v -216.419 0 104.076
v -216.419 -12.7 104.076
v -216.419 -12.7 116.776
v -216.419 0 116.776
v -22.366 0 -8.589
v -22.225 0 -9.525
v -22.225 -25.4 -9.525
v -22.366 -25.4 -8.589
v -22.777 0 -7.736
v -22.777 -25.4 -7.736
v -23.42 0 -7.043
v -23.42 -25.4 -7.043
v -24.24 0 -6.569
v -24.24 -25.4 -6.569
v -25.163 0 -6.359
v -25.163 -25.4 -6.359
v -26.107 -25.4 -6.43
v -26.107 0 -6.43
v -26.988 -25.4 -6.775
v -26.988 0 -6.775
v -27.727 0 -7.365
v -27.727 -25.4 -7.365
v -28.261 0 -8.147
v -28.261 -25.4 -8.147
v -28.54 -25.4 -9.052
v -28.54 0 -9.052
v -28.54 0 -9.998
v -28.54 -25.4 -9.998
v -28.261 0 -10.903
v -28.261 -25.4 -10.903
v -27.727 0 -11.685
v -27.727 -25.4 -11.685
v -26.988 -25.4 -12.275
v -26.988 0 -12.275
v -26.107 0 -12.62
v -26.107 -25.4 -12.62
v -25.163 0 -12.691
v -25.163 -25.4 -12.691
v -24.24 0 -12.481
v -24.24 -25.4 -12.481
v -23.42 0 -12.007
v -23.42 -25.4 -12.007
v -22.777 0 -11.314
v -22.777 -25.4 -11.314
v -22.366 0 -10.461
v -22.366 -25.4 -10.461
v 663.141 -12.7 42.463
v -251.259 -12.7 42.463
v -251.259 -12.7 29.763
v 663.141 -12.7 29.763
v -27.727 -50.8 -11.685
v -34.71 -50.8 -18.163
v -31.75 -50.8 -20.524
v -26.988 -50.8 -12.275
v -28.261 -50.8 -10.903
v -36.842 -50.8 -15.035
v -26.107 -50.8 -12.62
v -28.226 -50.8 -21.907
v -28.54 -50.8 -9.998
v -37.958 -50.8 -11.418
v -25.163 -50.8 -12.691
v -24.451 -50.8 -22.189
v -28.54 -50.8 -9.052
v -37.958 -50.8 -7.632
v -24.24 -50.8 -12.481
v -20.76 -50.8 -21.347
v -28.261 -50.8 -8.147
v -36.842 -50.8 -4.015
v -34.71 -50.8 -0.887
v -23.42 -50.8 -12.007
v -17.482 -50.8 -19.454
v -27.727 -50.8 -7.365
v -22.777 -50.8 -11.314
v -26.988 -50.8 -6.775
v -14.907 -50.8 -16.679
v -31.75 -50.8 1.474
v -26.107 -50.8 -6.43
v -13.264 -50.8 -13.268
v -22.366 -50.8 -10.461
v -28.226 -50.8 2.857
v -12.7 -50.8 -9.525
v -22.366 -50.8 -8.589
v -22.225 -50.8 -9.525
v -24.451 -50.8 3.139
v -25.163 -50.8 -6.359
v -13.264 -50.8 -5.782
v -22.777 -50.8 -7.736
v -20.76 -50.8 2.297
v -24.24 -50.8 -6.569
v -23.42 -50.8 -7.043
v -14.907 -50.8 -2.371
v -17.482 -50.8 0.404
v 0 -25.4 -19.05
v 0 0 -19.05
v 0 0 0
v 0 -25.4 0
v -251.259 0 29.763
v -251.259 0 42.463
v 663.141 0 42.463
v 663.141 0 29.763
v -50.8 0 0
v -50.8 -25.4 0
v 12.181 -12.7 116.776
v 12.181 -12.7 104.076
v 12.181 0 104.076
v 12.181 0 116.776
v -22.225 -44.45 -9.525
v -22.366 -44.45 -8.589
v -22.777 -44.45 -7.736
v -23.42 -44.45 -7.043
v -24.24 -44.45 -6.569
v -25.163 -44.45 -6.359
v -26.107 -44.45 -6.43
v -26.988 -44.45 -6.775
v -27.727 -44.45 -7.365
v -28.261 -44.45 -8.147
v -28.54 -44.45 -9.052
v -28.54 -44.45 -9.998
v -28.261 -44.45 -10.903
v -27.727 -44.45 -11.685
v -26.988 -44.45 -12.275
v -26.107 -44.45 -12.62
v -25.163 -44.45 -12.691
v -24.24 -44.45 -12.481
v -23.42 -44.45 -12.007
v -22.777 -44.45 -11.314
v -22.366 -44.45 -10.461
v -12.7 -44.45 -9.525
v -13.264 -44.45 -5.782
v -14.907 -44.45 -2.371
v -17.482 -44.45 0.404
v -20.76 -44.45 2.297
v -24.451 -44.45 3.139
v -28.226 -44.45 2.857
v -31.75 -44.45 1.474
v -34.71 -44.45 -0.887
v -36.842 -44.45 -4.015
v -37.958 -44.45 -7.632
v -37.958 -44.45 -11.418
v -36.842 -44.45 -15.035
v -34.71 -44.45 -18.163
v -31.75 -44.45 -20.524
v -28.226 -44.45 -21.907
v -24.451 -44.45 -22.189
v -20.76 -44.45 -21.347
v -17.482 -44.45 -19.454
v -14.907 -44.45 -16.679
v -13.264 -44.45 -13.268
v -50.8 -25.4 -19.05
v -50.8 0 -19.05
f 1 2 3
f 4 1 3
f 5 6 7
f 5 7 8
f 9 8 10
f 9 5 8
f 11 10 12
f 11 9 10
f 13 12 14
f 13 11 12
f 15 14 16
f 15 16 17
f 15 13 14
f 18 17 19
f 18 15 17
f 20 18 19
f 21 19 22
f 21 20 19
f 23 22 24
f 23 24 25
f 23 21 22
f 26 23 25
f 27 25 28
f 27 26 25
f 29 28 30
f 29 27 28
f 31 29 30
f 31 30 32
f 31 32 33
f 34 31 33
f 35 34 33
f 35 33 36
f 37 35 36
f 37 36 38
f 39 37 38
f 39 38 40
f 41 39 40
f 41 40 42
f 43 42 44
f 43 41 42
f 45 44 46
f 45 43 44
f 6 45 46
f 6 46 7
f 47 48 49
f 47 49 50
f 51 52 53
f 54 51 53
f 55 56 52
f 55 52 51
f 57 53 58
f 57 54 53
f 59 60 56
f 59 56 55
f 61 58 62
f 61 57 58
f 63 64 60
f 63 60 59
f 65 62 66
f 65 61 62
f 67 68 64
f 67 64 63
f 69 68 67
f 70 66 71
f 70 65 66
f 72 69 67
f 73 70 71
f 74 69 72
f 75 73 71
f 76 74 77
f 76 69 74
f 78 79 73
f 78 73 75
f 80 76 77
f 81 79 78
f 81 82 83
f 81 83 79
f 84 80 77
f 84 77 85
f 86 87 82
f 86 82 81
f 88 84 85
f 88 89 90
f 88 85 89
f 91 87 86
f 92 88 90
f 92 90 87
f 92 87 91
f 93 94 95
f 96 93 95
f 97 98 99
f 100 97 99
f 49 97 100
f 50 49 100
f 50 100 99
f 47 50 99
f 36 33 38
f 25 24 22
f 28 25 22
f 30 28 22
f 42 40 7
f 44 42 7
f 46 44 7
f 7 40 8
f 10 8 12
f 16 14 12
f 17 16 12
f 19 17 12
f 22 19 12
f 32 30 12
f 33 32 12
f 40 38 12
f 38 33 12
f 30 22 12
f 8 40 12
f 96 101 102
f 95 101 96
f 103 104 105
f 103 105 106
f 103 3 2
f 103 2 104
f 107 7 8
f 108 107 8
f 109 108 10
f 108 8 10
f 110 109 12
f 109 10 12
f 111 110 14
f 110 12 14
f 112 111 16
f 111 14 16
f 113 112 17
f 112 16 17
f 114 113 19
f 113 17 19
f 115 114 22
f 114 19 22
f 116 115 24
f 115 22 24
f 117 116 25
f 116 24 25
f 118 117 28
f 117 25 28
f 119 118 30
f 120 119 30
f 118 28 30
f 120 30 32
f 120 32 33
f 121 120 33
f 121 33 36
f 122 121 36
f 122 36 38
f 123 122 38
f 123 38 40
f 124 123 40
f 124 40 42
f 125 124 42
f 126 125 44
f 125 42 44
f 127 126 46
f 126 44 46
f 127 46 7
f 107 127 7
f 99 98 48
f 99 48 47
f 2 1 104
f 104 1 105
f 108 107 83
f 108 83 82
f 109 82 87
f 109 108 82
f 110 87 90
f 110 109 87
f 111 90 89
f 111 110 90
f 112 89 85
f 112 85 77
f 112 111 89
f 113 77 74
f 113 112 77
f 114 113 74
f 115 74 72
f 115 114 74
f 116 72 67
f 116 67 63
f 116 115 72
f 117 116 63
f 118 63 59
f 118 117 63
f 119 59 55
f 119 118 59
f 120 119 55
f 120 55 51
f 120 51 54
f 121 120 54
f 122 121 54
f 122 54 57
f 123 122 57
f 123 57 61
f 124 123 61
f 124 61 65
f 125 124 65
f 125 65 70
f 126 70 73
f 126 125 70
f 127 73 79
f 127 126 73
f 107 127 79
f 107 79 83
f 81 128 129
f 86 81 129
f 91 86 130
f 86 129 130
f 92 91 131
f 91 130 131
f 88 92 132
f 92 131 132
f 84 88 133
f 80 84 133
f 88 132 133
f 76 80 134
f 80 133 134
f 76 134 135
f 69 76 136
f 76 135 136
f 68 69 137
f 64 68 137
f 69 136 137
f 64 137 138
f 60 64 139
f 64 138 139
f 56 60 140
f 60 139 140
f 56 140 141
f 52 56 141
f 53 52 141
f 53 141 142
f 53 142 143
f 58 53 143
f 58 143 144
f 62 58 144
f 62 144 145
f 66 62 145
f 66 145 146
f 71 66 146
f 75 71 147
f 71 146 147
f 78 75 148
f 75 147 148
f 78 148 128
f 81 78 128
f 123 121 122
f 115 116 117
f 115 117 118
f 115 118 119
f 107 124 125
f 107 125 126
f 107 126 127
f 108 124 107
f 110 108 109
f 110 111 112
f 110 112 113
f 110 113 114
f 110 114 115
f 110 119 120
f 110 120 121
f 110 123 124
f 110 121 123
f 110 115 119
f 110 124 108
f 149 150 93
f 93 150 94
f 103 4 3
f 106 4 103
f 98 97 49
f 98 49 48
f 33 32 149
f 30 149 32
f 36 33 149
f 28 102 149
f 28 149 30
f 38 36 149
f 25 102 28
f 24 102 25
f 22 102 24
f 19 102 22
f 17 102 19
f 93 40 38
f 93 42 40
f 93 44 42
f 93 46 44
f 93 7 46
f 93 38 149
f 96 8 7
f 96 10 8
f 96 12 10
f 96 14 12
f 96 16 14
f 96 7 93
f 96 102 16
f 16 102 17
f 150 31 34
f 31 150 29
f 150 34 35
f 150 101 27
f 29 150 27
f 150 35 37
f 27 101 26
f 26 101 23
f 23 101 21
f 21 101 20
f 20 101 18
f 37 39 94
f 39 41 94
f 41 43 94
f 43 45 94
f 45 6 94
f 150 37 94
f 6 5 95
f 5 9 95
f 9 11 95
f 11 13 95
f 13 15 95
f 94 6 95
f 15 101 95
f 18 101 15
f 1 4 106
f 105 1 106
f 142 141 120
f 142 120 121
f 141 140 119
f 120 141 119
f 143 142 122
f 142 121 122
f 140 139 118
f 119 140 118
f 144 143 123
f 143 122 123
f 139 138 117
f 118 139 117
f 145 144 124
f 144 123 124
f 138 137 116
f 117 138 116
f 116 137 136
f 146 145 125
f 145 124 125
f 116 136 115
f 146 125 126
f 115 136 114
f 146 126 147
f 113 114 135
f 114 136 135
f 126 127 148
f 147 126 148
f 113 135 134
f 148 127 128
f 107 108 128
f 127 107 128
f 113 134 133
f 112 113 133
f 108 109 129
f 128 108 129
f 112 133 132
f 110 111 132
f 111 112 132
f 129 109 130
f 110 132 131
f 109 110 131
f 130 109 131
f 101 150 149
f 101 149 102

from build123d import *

# Parameters (mm, degrees)
F0_W     = 914.4
F0_H     = 12.7
F0_W_2   = 228.6
F1_DEPTH = 12.7
F2_W     = 50.8
F2_H     = 19.05
F2_R     = 3.175
F3_DEPTH = 25.4
F4_R     = 3.175
F5_DEPTH = 19.05
F6_R     = 12.7
F6_R_2   = 3.175
F7_DEPTH = 6.35


with BuildPart() as f1:
    # F0 (on Front) → F1 (new body)
    with BuildSketch(Plane.XZ):
        with Locations((205.940732, 36.113421)):
            Rectangle(F0_W, F0_H)
        with Locations((-102.119458, 110.425782)):
            Rectangle(F0_W_2, F0_H)
    extrude(amount=F1_DEPTH)


with BuildPart() as f3:
    # F2 (on Front) → F3 (new body)
    with BuildSketch(Plane.XZ):
        with Locations((-25.4, -9.525)):
            Rectangle(F2_W, F2_H)
        with Locations((-25.4, -9.525)):
            Circle(F2_R, mode=Mode.SUBTRACT)
    extrude(amount=F3_DEPTH)


with BuildPart() as f5:
    # F4 (on face) → F5 (new body)
    with BuildSketch(Plane.XZ.offset(25.4)):
        with Locations((-25.4, -9.525)):
            Circle(F4_R)
    extrude(amount=F5_DEPTH)


with BuildPart() as f7:
    # F6 (on face) → F7 (new body)
    with BuildSketch(Plane.XZ.offset(44.45)):
        with Locations((-25.4, -9.525)):
            Circle(F6_R)
        with Locations((-25.4, -9.525)):
            Circle(F6_R_2, mode=Mode.SUBTRACT)
    extrude(amount=F7_DEPTH)


solid = Compound([f1.part, f3.part, f5.part, f7.part])
